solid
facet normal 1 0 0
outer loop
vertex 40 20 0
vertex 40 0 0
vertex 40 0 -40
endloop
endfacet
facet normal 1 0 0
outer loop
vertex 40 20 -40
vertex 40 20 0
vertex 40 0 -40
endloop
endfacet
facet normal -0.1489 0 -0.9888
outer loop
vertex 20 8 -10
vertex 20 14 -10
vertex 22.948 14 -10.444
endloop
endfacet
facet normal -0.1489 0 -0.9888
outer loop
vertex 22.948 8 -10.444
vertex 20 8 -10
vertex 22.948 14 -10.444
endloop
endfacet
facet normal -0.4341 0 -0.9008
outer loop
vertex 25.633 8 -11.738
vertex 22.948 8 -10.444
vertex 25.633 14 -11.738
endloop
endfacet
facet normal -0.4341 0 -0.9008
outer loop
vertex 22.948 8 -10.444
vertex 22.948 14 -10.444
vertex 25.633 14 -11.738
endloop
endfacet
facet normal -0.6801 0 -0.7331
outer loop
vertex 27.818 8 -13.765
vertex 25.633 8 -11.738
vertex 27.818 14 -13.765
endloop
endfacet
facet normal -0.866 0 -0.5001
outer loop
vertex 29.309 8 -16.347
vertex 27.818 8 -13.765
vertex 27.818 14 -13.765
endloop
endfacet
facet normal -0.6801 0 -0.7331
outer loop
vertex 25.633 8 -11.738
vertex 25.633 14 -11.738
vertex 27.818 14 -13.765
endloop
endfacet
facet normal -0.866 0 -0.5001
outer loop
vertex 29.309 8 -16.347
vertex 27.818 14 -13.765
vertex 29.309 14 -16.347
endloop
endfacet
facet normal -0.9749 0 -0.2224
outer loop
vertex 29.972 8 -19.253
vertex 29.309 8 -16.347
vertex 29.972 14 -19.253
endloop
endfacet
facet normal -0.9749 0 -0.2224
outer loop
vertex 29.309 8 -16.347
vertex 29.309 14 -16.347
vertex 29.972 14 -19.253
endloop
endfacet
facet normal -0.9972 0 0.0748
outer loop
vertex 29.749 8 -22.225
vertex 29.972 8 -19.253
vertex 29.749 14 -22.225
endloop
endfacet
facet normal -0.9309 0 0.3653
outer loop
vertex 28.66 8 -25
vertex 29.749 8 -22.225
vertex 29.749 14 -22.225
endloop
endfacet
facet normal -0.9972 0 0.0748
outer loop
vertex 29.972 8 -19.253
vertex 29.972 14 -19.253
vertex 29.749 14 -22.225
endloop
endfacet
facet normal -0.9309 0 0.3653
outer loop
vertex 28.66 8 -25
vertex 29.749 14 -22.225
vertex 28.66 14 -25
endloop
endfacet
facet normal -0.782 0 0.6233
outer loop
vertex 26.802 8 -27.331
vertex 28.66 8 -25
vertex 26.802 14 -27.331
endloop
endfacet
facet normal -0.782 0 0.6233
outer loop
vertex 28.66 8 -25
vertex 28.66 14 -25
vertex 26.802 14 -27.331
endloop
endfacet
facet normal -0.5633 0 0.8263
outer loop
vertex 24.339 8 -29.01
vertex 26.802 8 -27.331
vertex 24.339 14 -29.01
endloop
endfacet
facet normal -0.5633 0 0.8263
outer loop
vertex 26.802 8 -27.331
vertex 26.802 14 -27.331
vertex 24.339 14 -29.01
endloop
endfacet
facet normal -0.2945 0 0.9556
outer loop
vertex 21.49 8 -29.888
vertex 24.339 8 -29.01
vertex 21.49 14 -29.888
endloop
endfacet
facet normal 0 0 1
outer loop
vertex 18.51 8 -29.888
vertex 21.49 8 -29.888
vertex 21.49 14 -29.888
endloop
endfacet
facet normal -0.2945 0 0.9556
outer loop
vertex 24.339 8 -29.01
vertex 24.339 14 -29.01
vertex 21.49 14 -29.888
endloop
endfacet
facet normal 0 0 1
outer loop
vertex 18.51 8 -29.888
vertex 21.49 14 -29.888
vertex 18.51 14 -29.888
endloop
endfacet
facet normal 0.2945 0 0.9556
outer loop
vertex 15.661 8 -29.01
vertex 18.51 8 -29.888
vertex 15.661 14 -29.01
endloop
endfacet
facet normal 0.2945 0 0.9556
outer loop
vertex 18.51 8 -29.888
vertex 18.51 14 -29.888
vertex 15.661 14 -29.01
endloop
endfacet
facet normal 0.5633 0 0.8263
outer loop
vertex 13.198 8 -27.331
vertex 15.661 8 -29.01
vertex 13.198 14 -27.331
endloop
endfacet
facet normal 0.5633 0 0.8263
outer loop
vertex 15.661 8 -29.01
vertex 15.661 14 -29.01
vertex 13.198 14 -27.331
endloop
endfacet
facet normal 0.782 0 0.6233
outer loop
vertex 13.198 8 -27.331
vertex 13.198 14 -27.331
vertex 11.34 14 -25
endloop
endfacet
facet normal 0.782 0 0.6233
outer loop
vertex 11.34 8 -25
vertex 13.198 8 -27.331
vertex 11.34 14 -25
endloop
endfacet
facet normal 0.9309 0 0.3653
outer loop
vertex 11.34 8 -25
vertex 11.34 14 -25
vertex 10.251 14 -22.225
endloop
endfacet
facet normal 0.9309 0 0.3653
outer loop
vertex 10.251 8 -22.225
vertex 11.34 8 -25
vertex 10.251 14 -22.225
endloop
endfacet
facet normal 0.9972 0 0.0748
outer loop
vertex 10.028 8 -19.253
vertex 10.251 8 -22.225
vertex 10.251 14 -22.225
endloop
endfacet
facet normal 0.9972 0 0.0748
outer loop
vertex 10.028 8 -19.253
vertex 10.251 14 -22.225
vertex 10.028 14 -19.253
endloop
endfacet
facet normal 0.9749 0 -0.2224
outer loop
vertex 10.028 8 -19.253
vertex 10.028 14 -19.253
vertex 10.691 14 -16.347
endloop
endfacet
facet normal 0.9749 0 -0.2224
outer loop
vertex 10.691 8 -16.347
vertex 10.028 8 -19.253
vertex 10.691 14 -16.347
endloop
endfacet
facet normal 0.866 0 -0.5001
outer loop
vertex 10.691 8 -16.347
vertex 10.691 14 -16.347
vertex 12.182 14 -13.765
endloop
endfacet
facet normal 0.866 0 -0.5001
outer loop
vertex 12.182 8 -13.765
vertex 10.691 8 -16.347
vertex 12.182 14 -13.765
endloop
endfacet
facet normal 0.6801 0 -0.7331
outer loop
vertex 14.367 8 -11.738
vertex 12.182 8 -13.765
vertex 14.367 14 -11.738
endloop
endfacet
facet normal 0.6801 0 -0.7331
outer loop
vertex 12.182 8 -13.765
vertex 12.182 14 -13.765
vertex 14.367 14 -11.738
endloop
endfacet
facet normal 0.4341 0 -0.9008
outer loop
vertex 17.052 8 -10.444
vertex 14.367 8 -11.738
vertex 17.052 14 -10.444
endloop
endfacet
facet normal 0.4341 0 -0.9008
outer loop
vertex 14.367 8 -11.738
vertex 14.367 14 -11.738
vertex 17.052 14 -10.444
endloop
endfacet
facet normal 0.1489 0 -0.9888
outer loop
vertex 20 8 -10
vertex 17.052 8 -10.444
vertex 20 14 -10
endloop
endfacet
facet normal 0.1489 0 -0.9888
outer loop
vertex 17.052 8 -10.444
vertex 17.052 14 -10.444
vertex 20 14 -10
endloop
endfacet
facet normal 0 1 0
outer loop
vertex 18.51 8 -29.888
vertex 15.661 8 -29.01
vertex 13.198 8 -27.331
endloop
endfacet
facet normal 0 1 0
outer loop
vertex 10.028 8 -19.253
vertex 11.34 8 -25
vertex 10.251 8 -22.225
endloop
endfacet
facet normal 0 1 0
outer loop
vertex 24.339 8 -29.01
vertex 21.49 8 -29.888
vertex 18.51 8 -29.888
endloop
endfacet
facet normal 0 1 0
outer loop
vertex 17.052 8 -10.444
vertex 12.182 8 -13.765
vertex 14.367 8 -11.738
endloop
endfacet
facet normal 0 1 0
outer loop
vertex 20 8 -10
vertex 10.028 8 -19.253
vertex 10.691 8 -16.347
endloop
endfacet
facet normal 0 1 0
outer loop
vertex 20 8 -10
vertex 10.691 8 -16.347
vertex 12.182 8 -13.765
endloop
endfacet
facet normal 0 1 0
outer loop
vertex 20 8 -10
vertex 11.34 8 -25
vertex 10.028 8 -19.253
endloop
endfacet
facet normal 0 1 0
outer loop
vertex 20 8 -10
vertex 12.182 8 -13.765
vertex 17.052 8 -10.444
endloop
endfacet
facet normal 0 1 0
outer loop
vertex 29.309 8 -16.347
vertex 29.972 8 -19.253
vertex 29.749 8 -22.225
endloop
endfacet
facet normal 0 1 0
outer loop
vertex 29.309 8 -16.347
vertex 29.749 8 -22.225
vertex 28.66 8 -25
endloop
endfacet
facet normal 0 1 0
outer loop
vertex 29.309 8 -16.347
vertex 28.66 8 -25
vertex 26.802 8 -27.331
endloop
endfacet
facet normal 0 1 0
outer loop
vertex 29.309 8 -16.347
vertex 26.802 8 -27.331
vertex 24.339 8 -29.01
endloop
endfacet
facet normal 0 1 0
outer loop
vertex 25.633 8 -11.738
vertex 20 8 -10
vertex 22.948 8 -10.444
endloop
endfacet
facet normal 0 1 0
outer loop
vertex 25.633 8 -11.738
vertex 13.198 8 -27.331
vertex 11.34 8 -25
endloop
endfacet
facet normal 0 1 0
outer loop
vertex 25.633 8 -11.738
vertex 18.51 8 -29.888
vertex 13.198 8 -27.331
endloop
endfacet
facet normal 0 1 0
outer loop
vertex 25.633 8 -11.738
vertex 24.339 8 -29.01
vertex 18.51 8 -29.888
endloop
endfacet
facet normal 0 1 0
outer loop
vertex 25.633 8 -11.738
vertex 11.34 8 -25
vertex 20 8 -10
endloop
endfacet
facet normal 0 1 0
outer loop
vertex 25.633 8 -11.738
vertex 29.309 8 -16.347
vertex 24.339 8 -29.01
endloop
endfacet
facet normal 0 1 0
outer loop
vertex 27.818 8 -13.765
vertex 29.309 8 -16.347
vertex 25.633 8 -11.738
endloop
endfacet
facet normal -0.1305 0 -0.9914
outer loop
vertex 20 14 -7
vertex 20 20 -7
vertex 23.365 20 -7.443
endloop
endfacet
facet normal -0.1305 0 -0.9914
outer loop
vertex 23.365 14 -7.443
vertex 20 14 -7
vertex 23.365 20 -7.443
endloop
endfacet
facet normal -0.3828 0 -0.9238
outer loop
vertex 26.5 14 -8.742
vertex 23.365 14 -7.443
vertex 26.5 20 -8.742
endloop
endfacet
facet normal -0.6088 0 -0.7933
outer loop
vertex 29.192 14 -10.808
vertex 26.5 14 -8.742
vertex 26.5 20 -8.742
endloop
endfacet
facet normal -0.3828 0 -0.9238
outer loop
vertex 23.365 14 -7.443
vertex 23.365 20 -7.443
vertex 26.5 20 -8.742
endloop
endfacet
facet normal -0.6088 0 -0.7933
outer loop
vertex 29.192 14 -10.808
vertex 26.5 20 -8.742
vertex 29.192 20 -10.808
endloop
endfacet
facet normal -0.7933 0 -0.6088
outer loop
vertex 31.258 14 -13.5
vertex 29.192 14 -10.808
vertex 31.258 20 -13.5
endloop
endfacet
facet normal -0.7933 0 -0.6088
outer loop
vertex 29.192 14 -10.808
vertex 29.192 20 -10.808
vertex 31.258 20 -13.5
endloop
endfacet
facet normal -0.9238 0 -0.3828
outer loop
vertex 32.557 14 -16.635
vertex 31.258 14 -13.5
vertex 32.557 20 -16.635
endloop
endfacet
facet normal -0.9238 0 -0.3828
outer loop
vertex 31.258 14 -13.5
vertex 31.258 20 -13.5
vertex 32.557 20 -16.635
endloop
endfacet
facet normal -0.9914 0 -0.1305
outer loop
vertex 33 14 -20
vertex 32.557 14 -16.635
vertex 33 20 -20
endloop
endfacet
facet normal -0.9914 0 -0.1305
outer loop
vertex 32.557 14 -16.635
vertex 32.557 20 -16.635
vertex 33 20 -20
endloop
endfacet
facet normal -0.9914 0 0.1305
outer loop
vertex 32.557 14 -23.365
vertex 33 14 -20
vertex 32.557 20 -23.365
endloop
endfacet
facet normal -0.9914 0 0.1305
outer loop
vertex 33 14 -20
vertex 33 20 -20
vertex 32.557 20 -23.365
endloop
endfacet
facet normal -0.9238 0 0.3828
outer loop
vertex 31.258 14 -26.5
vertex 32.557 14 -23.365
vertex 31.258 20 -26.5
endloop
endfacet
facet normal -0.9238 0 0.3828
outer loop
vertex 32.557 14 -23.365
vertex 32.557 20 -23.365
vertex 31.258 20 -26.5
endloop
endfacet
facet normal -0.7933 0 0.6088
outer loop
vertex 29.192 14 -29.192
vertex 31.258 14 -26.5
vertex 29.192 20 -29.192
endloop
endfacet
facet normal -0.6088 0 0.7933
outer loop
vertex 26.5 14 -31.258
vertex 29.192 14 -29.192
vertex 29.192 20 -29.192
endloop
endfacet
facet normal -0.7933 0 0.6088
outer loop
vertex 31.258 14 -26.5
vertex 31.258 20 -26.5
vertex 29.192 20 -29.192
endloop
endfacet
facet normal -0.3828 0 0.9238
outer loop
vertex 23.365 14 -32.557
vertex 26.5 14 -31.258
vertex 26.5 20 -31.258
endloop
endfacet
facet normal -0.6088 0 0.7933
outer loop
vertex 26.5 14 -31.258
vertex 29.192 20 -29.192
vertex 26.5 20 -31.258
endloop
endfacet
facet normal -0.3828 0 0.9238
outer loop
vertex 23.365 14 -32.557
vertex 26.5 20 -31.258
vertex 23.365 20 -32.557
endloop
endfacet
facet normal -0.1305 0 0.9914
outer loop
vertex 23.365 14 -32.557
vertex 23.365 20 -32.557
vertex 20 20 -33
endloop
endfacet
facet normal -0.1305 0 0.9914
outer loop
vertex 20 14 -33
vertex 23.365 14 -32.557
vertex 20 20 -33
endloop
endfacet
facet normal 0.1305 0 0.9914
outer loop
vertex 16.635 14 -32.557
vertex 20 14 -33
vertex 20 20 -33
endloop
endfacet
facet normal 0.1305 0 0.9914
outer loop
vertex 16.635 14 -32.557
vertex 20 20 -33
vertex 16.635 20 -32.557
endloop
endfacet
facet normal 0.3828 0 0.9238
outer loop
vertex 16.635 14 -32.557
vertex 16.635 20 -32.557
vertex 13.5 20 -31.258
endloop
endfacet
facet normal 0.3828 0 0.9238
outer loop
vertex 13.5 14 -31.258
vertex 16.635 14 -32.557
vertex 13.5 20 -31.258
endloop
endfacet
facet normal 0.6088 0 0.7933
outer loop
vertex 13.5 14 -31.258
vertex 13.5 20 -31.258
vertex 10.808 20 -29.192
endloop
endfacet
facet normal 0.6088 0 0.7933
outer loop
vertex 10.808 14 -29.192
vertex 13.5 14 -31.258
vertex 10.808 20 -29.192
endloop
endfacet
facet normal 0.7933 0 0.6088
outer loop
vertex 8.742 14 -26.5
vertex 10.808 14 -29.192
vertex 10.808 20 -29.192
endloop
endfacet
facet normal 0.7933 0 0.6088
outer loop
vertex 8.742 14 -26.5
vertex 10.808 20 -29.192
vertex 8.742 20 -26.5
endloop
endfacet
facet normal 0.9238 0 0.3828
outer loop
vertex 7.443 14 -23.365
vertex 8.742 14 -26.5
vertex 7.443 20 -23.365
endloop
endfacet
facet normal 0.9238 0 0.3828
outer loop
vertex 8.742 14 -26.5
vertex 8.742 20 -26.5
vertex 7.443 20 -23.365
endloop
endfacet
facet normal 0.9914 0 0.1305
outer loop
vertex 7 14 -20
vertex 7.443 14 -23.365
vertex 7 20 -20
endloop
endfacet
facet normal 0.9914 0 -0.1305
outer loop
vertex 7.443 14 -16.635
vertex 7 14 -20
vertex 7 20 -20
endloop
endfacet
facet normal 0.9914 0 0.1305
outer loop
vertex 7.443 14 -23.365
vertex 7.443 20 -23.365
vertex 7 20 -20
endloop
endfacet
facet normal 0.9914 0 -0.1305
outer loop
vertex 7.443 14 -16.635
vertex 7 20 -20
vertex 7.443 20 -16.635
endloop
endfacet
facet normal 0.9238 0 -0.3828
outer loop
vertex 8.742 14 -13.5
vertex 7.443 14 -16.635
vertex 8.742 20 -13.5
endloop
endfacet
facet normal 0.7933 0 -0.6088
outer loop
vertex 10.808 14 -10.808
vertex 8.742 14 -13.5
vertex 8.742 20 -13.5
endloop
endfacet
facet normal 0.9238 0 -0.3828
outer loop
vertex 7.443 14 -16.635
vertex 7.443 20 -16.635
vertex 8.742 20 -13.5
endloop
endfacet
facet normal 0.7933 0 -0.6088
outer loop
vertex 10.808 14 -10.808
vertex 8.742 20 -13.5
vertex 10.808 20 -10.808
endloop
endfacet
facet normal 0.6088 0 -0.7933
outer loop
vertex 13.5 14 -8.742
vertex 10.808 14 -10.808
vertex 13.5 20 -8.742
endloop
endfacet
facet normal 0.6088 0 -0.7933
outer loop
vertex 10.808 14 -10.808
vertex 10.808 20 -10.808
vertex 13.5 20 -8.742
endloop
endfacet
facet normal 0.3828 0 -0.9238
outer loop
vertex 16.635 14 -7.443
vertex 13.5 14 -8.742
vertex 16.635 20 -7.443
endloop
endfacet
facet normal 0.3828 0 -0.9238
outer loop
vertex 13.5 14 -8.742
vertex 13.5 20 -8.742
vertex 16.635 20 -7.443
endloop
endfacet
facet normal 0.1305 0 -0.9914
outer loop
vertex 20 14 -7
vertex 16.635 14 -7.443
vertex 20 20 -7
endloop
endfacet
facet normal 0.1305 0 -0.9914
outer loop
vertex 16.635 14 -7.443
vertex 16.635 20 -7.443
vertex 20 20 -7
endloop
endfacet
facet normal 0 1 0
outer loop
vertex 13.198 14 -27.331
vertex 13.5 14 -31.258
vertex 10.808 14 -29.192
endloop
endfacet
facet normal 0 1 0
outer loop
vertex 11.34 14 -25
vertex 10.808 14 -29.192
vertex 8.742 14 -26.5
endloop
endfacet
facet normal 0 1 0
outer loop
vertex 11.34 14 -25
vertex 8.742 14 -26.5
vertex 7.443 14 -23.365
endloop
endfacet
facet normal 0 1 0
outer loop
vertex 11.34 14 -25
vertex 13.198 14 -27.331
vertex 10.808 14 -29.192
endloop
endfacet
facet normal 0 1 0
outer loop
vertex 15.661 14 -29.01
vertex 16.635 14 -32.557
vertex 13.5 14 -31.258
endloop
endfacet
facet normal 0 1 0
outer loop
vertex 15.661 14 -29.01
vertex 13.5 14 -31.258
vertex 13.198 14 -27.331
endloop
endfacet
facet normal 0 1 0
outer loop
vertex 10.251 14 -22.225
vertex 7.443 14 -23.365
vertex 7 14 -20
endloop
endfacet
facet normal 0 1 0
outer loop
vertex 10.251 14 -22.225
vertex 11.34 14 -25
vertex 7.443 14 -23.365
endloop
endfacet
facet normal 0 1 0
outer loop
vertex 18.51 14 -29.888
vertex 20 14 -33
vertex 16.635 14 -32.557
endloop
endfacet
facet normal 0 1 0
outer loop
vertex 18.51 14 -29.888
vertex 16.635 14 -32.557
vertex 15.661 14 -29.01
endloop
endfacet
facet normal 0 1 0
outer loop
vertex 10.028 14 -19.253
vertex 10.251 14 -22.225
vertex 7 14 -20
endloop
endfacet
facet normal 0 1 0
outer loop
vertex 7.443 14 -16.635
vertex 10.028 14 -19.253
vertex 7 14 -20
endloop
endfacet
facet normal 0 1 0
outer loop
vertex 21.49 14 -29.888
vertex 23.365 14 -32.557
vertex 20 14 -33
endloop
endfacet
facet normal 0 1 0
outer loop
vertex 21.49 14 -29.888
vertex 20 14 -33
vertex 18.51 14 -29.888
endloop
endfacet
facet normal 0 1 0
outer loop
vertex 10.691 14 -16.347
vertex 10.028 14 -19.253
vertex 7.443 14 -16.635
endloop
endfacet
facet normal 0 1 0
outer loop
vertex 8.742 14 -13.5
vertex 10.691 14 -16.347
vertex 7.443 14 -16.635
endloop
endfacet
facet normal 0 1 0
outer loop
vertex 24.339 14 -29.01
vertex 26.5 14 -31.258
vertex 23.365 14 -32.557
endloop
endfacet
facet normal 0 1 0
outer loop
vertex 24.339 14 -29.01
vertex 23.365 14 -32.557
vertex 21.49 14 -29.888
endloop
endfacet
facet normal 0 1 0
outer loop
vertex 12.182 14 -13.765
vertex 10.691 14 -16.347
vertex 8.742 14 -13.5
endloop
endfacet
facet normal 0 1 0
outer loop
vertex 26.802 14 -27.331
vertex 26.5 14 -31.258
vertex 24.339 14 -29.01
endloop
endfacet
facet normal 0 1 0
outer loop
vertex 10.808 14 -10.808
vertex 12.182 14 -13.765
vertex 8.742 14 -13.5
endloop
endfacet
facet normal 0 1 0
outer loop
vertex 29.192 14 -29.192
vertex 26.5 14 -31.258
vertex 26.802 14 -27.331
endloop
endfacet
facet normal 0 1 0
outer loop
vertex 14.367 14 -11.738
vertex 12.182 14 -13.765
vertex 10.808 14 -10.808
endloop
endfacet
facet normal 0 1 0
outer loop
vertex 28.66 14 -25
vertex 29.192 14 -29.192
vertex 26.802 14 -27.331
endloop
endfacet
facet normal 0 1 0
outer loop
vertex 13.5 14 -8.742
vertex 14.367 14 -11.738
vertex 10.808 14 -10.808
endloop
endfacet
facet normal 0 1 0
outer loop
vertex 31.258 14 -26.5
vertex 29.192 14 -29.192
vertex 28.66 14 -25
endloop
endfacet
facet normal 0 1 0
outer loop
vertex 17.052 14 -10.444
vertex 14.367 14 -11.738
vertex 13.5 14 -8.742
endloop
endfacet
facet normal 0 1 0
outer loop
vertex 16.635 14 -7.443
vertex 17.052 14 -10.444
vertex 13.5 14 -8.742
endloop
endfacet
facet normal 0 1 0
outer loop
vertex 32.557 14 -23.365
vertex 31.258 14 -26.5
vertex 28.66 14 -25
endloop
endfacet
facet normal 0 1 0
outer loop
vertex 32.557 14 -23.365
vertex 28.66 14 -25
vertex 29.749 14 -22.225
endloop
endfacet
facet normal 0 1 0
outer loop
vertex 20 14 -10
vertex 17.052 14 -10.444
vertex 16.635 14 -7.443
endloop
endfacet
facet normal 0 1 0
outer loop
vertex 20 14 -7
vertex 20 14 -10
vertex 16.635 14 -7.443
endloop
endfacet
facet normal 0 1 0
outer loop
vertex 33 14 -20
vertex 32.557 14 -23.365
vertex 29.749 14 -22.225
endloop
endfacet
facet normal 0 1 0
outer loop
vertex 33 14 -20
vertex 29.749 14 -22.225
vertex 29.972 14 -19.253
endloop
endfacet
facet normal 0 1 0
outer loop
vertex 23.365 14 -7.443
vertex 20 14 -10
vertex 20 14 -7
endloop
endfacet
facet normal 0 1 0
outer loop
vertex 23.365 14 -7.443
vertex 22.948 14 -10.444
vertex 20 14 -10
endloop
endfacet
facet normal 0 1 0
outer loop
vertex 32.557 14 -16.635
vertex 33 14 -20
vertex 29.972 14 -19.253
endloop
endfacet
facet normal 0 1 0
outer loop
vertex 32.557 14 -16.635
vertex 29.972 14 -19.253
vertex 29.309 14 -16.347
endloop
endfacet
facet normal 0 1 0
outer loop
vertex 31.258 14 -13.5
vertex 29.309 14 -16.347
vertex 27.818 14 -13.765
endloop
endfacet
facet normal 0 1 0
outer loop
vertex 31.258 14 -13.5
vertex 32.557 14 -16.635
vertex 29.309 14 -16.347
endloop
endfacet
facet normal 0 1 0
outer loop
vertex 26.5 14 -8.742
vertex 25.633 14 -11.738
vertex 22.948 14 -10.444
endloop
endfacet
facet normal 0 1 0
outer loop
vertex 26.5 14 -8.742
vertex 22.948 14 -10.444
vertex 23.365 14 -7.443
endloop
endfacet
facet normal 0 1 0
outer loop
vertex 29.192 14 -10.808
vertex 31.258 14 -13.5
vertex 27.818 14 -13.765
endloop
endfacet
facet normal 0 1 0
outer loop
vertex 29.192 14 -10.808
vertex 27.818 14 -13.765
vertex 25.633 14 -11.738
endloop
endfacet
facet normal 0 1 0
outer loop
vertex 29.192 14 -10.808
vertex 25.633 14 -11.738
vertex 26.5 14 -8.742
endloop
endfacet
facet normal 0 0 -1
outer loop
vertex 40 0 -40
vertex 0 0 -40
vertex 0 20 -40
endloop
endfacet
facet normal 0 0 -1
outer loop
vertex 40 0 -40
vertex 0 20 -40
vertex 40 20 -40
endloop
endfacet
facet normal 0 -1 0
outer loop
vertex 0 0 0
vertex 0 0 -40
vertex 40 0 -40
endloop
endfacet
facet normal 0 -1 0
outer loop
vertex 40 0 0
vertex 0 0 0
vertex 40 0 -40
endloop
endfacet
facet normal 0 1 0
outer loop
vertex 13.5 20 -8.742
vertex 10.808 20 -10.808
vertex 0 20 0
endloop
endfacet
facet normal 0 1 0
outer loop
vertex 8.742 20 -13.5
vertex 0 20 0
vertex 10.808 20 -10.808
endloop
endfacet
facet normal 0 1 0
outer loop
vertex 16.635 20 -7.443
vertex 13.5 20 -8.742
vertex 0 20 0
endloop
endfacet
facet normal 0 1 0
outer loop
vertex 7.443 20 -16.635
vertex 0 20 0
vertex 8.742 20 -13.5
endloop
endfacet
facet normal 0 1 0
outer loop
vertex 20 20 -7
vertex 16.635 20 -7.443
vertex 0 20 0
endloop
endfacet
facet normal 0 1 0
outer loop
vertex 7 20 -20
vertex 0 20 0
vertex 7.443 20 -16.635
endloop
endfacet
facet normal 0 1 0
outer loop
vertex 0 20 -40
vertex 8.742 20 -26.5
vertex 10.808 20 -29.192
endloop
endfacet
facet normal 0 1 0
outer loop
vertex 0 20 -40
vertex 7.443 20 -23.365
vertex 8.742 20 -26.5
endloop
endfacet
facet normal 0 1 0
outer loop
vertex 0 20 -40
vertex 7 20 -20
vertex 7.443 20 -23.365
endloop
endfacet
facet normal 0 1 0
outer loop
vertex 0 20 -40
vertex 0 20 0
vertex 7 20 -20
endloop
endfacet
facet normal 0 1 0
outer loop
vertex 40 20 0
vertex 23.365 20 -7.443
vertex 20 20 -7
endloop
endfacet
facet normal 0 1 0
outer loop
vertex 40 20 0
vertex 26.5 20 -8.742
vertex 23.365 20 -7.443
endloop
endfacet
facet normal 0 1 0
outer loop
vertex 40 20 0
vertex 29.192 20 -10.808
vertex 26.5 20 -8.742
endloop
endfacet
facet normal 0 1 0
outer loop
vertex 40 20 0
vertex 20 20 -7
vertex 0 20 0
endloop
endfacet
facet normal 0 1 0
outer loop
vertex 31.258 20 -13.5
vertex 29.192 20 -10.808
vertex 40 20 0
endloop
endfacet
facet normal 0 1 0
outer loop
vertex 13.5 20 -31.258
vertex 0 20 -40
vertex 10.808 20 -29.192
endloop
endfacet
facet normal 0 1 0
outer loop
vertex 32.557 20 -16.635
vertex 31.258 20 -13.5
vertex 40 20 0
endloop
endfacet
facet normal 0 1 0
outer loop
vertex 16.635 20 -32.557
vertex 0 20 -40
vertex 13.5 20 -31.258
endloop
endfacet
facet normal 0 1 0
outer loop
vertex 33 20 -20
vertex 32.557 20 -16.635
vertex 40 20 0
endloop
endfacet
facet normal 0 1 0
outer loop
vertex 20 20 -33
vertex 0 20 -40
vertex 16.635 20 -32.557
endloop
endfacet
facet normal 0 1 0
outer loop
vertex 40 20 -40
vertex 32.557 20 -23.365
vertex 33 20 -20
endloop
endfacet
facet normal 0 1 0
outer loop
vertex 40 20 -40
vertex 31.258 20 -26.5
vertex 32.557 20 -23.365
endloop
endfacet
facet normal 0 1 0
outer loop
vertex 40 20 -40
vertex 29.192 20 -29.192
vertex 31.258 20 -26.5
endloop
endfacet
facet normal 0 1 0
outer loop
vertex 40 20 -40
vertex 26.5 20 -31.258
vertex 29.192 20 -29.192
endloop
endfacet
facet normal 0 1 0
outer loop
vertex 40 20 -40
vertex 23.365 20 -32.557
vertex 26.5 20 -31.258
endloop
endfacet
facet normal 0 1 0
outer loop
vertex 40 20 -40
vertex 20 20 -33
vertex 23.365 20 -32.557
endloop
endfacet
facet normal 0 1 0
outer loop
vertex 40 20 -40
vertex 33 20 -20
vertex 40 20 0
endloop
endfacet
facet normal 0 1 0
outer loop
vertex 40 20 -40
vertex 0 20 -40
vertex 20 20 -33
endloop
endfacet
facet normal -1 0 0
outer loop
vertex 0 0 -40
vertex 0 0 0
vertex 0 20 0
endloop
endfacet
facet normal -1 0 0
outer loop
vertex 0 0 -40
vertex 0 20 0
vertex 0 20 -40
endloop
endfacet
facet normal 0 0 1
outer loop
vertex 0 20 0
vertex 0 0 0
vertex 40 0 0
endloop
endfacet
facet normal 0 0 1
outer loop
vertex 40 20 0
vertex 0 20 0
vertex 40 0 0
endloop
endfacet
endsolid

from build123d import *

# Parameters (mm, degrees)
SKETCH_1_W          = 40
SKETCH_1_H          = 40
EXTRUDE_1_DEPTH     = 20
SKETCH_2_R          = 13
CUT_EXTRUDE_1_DEPTH = 6
SKETCH_3_R          = 10
CUT_EXTRUDE_2_DEPTH = 6


with BuildPart() as part:
    # Эскиз1 → Бобышка-Вытянуть1 (new body)
    with BuildSketch(Plane(origin=(0, 0, 0), x_dir=(1, 0, 0), z_dir=(0, 1, 0))):
        with Locations((20, 20)):
            Rectangle(SKETCH_1_W, SKETCH_1_H)
    extrude(amount=EXTRUDE_1_DEPTH)

    # Эскиз2 → Вырез-Вытянуть1 (cut)
    with BuildSketch(Plane(origin=(0, 20, 0), x_dir=(1, 0, 0), z_dir=(0, 1, 0))):
        with Locations(Location((20, 20, 0), (0, 0, 270))):
            Circle(SKETCH_2_R)
    extrude(amount=-CUT_EXTRUDE_1_DEPTH, mode=Mode.SUBTRACT)

    # Эскиз3 → Вырез-Вытянуть2 (cut)
    with BuildSketch(Plane(origin=(0, 14, 0), x_dir=(1, 0, 0), z_dir=(0, 1, 0))):
        with Locations(Location((20, 20, 0), (0, 0, 270))):
            Circle(SKETCH_3_R)
    extrude(amount=-CUT_EXTRUDE_2_DEPTH, mode=Mode.SUBTRACT)


solid = part.part
